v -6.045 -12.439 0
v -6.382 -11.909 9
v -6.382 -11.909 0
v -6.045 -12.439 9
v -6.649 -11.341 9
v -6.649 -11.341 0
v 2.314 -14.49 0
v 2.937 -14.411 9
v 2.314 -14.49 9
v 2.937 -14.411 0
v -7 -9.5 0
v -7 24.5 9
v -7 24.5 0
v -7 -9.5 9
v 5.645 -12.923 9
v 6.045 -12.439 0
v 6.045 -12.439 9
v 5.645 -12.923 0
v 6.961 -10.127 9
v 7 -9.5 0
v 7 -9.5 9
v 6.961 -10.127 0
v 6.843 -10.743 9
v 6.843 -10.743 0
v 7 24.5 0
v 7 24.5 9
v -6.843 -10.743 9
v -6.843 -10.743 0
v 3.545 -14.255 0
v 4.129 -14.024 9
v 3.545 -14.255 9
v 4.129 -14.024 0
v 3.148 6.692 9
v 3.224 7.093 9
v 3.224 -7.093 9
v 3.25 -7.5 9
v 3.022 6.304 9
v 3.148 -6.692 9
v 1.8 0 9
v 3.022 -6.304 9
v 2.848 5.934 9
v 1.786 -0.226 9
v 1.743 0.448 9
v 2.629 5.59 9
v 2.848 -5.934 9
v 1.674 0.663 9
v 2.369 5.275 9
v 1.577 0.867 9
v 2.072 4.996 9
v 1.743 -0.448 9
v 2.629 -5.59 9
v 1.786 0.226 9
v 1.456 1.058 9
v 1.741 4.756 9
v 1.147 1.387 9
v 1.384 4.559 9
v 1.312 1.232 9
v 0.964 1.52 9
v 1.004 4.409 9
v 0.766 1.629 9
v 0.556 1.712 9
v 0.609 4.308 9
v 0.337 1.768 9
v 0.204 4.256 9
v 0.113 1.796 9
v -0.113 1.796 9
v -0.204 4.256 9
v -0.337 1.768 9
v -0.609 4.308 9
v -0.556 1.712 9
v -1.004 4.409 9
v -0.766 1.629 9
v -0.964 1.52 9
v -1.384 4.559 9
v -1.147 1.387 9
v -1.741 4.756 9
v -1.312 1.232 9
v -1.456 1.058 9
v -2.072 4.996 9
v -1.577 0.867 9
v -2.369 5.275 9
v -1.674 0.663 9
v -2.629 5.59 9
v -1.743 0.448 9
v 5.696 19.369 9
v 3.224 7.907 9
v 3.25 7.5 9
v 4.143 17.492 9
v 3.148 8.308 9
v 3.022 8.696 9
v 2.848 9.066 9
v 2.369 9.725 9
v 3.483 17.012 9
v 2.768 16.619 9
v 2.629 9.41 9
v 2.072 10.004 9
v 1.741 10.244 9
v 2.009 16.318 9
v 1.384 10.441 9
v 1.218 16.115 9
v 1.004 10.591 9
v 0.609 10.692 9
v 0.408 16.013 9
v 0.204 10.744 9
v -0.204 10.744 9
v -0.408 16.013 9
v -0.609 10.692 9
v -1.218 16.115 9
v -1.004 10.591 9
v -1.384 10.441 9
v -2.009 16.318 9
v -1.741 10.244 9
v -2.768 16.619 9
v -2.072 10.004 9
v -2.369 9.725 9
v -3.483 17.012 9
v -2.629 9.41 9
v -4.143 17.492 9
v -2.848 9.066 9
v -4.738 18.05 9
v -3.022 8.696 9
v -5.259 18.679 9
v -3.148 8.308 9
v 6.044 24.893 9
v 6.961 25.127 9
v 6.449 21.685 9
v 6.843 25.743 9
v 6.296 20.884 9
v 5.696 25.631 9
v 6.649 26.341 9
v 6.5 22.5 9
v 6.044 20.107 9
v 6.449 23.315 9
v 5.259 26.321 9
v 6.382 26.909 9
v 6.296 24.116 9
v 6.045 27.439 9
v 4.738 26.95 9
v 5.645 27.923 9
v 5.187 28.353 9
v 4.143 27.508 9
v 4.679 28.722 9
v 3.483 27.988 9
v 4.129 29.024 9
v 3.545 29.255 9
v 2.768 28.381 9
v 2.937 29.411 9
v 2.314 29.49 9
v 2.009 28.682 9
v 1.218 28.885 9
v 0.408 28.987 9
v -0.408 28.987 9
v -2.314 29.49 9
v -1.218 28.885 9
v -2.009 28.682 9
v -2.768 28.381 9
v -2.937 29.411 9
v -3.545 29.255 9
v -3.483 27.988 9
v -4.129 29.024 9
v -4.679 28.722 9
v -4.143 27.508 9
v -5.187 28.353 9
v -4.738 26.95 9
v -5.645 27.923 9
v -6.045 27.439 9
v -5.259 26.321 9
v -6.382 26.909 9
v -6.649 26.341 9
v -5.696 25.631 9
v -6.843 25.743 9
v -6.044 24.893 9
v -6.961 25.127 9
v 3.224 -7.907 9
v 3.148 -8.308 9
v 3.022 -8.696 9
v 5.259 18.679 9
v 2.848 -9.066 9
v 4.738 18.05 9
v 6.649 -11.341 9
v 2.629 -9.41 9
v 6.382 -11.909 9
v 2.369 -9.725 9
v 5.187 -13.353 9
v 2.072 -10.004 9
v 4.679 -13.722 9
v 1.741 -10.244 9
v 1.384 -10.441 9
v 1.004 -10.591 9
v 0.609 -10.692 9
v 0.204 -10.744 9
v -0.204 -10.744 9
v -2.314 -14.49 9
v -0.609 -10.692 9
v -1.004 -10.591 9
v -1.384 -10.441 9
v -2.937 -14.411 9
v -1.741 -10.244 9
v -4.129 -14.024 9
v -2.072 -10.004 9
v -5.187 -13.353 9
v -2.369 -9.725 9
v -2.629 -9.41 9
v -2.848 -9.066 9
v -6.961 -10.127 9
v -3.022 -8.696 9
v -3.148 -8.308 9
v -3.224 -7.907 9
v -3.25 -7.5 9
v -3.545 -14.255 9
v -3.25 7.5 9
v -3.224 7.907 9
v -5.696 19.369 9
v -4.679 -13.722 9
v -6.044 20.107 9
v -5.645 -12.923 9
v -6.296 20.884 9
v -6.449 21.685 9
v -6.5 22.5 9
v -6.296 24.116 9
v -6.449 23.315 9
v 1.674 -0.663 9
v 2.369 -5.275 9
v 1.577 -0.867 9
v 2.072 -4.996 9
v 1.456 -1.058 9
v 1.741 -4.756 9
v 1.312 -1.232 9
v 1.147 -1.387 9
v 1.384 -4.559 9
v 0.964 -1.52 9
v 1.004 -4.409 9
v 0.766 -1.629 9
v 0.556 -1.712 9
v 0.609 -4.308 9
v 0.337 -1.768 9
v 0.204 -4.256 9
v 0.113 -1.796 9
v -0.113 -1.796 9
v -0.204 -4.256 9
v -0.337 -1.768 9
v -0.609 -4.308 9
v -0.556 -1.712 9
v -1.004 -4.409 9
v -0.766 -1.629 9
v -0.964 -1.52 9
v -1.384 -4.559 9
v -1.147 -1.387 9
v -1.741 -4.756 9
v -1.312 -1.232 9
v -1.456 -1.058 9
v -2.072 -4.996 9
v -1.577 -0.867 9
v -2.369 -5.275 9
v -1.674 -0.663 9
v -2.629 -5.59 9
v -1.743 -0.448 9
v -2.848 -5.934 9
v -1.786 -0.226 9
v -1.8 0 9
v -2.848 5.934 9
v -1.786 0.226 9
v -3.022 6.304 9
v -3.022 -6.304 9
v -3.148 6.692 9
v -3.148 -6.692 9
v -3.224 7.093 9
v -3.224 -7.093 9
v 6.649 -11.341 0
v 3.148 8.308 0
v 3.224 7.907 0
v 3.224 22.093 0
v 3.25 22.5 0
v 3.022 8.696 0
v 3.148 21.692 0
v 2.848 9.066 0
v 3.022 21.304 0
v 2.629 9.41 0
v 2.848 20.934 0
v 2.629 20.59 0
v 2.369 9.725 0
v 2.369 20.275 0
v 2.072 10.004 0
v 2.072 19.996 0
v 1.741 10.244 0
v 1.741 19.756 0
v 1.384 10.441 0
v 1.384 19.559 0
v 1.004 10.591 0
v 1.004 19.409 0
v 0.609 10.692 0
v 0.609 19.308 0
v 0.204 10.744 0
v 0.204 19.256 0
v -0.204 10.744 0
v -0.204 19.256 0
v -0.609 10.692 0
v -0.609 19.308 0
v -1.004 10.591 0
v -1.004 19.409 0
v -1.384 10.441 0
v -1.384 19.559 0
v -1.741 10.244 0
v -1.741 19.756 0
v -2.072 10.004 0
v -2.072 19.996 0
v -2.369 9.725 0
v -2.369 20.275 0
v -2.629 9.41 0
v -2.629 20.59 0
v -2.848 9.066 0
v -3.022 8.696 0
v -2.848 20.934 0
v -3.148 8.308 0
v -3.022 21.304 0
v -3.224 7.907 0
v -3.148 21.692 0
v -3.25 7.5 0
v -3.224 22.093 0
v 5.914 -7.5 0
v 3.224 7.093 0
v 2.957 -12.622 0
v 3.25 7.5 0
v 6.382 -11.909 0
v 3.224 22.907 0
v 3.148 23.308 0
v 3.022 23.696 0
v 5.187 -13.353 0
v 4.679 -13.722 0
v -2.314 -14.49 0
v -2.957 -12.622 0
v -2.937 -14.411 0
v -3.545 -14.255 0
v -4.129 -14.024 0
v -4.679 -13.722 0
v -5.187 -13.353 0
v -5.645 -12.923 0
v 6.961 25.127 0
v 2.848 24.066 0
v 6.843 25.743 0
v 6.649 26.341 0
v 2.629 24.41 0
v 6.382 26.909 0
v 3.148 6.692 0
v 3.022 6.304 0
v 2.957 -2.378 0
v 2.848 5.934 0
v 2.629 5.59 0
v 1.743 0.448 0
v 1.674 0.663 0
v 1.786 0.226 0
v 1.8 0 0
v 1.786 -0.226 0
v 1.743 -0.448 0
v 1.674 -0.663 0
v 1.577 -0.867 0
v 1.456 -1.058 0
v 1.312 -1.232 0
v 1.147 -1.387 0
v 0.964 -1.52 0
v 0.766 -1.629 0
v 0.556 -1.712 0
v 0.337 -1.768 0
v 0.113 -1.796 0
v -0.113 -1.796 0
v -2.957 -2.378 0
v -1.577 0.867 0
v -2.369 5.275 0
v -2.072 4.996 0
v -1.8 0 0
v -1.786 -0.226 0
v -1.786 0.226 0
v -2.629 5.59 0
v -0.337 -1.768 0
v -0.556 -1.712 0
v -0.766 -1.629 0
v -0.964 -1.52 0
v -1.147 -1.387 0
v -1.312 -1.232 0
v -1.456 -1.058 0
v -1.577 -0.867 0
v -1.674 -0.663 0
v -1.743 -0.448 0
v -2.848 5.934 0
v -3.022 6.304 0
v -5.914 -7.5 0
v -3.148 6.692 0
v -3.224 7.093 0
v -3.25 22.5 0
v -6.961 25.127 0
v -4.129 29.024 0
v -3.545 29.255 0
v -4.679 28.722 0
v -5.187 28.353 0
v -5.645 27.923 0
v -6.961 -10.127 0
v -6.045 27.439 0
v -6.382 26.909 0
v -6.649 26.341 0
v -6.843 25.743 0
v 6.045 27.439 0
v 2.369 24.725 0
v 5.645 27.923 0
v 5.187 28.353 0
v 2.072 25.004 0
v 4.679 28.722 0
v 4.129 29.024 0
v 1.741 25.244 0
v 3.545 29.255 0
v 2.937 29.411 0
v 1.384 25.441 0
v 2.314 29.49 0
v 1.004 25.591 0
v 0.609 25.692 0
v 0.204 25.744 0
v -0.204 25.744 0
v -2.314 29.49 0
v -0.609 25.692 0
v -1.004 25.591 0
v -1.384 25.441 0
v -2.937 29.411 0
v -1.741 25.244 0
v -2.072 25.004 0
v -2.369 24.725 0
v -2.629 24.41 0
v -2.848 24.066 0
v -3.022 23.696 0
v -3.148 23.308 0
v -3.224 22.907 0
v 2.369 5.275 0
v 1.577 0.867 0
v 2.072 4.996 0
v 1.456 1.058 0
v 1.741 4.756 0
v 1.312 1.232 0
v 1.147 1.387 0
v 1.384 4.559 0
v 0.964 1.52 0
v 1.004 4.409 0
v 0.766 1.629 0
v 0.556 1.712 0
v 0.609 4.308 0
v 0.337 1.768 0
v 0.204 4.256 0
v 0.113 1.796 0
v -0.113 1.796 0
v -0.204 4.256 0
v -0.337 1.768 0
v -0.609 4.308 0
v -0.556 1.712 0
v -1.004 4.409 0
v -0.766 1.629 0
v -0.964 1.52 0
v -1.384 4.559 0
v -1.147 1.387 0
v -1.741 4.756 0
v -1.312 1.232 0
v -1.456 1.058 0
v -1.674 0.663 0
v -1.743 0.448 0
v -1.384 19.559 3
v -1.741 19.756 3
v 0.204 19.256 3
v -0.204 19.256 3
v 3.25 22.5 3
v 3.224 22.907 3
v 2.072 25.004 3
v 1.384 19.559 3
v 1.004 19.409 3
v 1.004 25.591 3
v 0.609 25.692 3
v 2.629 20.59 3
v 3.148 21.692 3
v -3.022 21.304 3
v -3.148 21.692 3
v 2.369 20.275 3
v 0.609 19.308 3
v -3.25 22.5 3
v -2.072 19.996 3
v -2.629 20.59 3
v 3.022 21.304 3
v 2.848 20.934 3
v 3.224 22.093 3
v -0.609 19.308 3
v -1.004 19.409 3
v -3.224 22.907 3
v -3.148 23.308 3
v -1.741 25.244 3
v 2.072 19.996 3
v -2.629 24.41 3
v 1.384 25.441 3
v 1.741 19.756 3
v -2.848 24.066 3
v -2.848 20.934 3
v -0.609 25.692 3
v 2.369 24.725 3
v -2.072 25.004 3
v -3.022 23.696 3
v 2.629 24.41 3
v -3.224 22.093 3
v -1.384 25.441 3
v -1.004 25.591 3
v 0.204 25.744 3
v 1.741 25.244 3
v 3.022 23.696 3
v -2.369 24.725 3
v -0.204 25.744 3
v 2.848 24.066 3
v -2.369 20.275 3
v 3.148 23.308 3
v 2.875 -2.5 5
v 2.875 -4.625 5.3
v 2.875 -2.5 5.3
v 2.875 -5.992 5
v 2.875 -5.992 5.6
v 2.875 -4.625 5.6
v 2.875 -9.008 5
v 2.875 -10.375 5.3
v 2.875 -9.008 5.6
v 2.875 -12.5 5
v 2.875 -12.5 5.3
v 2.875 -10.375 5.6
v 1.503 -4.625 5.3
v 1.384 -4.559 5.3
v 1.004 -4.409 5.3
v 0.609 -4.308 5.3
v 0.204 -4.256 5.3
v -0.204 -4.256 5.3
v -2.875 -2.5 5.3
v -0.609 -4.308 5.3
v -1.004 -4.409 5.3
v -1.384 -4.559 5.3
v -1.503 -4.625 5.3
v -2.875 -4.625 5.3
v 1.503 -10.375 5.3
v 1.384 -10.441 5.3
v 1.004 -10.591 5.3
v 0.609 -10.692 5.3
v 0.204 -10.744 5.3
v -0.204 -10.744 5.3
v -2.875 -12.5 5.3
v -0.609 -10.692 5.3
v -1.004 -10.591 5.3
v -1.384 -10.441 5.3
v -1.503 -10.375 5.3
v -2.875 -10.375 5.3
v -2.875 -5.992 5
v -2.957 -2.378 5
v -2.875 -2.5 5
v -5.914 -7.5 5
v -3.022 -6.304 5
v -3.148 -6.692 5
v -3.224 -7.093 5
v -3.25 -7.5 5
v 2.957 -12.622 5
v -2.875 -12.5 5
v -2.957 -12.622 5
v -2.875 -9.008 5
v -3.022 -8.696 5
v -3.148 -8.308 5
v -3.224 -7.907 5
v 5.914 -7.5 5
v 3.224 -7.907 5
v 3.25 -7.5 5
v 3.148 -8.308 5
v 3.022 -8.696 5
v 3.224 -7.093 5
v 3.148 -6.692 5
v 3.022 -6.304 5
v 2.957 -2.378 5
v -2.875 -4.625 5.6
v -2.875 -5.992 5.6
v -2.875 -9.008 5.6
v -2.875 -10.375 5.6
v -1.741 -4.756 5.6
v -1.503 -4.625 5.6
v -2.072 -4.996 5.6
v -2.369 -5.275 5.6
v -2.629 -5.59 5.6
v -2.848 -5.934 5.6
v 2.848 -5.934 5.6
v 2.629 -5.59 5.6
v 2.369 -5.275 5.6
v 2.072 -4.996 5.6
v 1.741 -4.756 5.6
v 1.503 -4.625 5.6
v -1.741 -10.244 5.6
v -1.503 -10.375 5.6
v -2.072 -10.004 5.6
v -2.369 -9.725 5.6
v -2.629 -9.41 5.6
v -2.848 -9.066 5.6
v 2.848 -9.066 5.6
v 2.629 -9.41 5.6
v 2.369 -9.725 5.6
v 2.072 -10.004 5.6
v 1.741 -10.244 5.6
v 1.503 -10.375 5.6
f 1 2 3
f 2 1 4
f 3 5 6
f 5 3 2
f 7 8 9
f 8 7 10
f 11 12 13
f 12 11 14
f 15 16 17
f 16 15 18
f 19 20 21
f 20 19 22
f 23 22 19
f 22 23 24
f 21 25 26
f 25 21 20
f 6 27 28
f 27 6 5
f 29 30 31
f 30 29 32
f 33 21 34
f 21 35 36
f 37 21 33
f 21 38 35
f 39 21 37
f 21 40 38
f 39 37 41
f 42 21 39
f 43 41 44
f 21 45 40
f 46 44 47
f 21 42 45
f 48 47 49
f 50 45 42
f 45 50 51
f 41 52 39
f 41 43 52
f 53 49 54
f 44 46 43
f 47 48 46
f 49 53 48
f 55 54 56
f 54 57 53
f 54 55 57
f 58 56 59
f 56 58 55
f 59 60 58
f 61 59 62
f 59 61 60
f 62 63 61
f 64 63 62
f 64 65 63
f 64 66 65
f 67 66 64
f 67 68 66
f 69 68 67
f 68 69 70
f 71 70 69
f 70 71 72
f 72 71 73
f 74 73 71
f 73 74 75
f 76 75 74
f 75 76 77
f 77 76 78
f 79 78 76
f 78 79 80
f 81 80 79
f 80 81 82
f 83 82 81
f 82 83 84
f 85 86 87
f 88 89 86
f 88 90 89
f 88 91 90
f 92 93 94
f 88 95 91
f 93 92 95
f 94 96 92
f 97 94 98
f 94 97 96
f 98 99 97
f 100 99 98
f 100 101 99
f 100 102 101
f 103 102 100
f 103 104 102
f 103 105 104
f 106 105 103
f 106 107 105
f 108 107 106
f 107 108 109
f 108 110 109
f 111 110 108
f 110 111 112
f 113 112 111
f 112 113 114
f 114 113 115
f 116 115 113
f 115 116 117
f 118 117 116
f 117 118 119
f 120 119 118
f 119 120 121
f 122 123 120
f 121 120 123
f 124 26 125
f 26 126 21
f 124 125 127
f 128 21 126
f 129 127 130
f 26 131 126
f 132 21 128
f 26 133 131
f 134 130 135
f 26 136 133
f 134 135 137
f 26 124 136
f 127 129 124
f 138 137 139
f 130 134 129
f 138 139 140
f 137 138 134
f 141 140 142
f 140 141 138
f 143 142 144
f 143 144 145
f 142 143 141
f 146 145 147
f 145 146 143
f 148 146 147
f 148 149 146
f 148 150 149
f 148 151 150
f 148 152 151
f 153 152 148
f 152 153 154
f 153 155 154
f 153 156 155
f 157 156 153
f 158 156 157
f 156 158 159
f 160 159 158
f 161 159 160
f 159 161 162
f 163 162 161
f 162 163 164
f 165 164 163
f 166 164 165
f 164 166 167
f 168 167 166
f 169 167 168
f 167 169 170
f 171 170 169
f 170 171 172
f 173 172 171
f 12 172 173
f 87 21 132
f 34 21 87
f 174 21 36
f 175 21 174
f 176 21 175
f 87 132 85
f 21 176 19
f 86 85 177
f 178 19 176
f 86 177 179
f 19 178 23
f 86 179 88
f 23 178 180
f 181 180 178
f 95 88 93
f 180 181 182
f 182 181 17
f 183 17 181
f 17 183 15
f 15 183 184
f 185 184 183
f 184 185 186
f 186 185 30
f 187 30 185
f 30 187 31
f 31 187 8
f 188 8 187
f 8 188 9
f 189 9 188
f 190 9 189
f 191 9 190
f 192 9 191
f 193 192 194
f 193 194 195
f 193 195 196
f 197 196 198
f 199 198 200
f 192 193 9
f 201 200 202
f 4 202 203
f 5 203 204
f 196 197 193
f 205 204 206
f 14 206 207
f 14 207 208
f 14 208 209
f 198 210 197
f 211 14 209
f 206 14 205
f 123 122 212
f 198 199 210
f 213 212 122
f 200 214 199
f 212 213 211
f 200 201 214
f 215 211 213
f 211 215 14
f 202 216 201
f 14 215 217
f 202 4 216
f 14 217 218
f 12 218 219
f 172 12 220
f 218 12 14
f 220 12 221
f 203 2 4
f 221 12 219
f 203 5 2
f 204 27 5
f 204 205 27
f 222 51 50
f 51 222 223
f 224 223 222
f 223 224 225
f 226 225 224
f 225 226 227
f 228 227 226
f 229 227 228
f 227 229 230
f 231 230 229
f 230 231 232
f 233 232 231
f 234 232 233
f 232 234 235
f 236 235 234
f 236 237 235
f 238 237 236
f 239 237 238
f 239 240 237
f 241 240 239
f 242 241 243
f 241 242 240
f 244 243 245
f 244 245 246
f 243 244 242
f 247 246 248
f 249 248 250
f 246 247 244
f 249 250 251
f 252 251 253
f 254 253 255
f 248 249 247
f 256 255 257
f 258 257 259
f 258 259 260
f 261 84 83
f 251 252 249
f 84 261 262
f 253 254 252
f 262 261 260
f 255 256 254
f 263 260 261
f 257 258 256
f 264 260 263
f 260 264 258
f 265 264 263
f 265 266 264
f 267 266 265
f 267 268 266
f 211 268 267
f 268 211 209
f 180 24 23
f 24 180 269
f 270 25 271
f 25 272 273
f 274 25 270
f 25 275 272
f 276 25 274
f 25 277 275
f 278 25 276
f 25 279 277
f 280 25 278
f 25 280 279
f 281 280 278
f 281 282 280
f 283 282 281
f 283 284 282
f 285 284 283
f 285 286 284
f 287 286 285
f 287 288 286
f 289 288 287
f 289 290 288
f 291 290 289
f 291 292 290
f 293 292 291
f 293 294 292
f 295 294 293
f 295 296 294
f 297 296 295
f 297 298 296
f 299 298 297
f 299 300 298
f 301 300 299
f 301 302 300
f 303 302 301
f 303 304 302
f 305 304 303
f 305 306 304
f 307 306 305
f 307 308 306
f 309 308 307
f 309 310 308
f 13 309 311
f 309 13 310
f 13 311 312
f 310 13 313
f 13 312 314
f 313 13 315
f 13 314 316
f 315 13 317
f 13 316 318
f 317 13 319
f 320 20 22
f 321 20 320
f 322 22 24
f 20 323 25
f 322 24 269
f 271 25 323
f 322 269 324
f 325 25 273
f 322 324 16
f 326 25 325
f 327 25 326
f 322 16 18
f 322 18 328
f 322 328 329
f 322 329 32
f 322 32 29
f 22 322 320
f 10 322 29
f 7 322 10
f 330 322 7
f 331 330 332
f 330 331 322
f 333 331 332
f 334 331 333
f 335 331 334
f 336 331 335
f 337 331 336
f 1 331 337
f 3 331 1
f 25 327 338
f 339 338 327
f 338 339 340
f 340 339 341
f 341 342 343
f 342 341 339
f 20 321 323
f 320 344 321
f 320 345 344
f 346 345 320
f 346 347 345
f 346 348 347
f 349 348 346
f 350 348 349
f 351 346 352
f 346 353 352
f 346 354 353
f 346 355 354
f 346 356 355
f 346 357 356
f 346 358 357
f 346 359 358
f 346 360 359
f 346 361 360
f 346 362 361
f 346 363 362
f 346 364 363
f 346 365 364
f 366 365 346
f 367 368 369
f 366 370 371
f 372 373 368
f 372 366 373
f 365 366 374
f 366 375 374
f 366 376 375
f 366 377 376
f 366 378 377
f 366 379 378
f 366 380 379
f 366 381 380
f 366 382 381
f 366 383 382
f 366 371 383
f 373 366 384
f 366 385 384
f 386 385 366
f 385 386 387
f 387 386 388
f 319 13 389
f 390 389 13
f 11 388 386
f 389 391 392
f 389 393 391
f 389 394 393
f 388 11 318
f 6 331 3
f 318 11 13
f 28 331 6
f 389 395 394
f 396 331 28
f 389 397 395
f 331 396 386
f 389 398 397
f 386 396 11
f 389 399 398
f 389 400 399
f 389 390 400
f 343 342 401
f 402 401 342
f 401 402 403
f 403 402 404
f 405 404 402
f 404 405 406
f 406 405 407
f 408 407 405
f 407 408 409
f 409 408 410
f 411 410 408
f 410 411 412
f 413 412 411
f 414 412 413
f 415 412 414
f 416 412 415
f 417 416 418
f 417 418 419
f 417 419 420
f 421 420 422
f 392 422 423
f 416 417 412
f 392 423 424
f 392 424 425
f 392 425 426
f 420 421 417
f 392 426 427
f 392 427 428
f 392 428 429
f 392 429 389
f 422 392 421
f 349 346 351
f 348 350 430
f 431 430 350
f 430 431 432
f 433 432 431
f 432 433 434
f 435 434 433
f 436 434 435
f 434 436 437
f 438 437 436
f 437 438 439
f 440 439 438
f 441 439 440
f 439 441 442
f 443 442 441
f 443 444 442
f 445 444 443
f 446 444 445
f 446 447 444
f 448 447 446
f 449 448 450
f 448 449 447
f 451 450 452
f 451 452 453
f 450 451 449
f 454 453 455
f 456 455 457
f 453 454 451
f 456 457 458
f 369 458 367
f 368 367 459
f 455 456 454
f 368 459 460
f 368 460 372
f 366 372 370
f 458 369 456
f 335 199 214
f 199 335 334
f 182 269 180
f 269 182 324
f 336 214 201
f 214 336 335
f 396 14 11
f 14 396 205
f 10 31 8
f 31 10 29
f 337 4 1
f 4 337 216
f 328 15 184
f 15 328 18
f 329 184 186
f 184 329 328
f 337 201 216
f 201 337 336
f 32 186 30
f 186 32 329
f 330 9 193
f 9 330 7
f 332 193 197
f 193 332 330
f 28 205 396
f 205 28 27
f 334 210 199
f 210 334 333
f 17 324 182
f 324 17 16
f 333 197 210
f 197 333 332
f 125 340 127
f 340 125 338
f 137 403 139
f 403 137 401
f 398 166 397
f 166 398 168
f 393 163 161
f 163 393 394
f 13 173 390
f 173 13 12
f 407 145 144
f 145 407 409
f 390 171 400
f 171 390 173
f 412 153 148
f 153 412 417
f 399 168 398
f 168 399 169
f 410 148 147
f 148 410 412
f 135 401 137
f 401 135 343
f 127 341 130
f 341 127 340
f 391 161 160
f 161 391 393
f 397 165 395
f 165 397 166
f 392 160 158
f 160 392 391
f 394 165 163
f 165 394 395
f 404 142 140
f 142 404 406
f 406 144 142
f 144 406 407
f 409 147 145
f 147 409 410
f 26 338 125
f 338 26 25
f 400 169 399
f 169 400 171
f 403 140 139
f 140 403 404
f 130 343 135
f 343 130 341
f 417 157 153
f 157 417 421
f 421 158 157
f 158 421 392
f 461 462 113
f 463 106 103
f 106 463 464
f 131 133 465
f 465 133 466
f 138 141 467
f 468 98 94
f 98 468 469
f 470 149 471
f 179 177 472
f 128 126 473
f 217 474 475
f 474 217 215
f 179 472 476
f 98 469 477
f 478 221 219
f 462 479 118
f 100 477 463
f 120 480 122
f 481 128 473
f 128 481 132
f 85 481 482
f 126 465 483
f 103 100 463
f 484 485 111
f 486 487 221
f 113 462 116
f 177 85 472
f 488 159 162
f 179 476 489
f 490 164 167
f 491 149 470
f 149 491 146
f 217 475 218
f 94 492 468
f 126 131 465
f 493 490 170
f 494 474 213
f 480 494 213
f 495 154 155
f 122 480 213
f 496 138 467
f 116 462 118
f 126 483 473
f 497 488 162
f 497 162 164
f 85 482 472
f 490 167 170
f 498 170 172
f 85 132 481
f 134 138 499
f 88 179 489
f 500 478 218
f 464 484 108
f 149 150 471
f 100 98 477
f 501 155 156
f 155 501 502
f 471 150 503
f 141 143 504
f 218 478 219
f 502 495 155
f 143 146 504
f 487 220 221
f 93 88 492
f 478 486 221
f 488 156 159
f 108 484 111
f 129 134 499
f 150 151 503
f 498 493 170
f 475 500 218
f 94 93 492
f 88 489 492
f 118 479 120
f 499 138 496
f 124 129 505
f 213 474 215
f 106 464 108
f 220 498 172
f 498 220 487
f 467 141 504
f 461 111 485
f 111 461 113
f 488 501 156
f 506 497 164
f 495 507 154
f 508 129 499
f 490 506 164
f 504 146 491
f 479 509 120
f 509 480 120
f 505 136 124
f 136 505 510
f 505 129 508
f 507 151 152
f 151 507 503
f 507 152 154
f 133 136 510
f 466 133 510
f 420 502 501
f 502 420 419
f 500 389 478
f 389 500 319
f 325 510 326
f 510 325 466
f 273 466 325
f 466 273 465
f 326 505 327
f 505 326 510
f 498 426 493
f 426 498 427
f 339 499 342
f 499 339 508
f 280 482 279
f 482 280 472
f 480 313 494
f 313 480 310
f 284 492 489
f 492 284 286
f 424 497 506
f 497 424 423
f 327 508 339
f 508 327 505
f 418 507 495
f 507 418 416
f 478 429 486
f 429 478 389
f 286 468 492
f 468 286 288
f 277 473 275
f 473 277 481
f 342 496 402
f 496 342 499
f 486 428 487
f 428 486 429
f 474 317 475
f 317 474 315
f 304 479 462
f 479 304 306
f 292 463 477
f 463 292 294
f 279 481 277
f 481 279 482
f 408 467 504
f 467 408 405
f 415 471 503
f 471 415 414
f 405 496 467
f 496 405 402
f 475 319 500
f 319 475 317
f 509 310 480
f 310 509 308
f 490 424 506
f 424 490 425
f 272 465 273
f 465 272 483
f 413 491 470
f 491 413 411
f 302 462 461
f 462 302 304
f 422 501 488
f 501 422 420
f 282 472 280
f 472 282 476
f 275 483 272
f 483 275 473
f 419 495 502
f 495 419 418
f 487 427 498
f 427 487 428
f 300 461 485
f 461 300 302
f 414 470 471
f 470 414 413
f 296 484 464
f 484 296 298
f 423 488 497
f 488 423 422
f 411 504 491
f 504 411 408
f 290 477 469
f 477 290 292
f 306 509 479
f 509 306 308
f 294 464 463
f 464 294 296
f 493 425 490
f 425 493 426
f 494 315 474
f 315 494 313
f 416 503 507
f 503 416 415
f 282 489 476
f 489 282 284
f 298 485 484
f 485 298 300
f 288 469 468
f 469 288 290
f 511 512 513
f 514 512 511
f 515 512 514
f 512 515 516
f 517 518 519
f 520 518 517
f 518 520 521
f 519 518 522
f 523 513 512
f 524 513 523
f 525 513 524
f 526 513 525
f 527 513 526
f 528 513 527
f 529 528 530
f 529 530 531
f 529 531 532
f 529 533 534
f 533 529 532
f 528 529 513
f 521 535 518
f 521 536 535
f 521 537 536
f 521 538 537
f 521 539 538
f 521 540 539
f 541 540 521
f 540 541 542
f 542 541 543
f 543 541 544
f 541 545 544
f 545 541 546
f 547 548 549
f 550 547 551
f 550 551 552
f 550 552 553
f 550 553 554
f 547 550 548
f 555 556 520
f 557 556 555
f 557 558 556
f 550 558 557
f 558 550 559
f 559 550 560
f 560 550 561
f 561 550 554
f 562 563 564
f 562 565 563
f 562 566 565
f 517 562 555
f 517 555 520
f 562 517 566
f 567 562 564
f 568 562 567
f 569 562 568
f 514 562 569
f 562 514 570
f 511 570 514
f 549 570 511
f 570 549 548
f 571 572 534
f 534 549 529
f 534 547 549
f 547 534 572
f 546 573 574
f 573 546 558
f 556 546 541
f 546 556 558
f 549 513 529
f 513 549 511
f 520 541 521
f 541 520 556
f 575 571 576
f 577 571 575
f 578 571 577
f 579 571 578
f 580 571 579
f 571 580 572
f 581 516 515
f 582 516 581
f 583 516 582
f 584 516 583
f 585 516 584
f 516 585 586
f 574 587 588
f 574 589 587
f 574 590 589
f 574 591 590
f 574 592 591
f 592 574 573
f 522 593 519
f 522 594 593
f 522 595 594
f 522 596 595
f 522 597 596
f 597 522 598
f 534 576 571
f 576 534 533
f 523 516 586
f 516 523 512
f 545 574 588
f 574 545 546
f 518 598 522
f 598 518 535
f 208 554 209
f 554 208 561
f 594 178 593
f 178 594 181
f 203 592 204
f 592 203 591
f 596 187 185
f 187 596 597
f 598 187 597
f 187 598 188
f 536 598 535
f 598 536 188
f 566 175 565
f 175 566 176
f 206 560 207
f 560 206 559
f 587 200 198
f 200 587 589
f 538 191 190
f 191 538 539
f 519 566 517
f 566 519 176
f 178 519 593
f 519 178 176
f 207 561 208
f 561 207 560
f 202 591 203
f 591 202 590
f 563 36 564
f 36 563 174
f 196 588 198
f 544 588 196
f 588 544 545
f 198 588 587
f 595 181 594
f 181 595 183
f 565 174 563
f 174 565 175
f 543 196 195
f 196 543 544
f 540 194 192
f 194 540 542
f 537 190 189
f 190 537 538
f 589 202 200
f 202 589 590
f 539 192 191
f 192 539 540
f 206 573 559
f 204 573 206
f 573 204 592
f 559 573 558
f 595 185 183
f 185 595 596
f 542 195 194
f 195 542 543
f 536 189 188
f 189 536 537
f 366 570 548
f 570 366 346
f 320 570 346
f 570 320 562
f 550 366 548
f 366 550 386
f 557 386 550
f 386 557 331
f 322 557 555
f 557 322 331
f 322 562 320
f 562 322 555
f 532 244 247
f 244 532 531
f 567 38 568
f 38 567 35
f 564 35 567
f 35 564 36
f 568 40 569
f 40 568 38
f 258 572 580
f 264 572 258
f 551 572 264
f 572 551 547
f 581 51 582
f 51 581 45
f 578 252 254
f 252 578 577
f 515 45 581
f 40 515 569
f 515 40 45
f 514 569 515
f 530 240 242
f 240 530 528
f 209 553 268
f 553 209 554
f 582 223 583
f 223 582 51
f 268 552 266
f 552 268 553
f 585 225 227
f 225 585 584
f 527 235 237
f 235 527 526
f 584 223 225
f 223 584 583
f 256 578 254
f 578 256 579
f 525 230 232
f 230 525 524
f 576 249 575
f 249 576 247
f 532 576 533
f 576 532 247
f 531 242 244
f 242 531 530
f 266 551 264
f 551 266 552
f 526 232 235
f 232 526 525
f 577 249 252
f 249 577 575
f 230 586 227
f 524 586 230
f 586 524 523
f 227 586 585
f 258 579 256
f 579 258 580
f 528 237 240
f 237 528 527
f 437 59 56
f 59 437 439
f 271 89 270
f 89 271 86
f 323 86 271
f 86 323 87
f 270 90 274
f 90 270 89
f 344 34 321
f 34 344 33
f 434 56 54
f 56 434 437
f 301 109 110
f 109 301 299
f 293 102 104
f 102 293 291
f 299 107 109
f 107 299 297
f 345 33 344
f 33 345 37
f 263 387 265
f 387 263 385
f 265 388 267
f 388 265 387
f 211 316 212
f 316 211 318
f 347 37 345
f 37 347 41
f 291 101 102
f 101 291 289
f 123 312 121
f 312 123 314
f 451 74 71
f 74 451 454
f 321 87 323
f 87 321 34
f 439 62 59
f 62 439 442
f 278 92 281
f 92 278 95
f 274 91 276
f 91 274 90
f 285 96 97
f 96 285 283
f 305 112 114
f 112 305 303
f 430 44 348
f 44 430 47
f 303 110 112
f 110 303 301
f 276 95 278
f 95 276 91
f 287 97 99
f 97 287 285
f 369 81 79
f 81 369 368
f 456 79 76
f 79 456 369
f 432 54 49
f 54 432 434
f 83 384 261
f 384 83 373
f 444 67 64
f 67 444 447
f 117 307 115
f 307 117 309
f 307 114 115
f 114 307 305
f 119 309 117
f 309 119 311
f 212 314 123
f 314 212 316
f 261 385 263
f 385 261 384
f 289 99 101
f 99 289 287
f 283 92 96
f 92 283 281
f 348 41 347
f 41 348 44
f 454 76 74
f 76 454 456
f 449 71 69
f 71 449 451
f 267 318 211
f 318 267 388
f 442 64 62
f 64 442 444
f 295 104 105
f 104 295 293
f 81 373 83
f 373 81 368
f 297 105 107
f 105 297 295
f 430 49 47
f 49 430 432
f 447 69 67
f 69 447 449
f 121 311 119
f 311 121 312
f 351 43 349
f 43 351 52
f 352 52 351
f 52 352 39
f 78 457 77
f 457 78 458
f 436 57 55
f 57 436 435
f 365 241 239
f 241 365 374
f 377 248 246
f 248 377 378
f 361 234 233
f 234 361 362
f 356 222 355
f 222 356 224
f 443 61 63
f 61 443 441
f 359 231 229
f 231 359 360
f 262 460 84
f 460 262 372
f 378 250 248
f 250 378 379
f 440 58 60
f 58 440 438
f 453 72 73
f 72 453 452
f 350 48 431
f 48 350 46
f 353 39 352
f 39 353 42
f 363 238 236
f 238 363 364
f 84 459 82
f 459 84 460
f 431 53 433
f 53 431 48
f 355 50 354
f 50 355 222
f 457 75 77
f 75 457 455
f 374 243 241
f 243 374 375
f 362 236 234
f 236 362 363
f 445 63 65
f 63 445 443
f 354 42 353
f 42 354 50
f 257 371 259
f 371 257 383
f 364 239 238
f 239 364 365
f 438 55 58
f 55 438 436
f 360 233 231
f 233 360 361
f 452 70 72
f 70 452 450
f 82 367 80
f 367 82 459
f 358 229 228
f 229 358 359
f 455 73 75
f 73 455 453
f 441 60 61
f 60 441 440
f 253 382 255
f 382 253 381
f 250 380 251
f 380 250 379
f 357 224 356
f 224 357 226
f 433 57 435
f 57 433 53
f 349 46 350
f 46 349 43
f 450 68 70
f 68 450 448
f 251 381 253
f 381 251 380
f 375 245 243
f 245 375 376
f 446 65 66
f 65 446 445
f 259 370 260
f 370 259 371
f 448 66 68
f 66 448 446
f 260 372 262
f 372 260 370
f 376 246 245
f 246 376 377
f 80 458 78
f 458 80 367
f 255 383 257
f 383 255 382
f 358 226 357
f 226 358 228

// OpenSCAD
$fn = 50;


difference() {
	union() {
		hull() {
			translate(v = [-2.0000000000, 9.5000000000, 0]) {
				cylinder(h = 9, r = 5);
			}
			translate(v = [2.0000000000, 9.5000000000, 0]) {
				cylinder(h = 9, r = 5);
			}
			translate(v = [-2.0000000000, -9.5000000000, 0]) {
				cylinder(h = 9, r = 5);
			}
			translate(v = [2.0000000000, -9.5000000000, 0]) {
				cylinder(h = 9, r = 5);
			}
		}
		translate(v = [0.0000000000, 15.0000000000, 0]) {
			hull() {
				translate(v = [-2.0000000000, 9.5000000000, 0]) {
					cylinder(h = 9, r = 5);
				}
				translate(v = [2.0000000000, 9.5000000000, 0]) {
					cylinder(h = 9, r = 5);
				}
				translate(v = [-2.0000000000, -9.5000000000, 0]) {
					cylinder(h = 9, r = 5);
				}
				translate(v = [2.0000000000, -9.5000000000, 0]) {
					cylinder(h = 9, r = 5);
				}
			}
		}
		translate(v = [0.0000000000, 15.0000000000, 0]) {
			hull() {
				translate(v = [-2.0000000000, 9.5000000000, 0]) {
					cylinder(h = 9, r = 5);
				}
				translate(v = [2.0000000000, 9.5000000000, 0]) {
					cylinder(h = 9, r = 5);
				}
				translate(v = [-2.0000000000, -9.5000000000, 0]) {
					cylinder(h = 9, r = 5);
				}
				translate(v = [2.0000000000, -9.5000000000, 0]) {
					cylinder(h = 9, r = 5);
				}
			}
		}
	}
	union() {
		translate(v = [0.0000000000, 22.5000000000, 9]) {
			rotate(a = [0, 0, 0]) {
				difference() {
					union() {
						#translate(v = [0, 0, -9.0000000000]) {
							cylinder(h = 9, r = 2.2500000000);
						}
						#translate(v = [0, 0, -6]) {
							cylinder(h = 6, r1 = 3.2500000000, r2 = 6.5000000000);
						}
						#translate(v = [0, 0, -9.0000000000]) {
							cylinder(h = 9, r = 3.2500000000);
						}
						#translate(v = [0, 0, -9.0000000000]) {
							cylinder(h = 9, r = 2.2500000000);
						}
					}
					union();
				}
			}
		}
		translate(v = [0.0000000000, 22.5000000000, 9]) {
			rotate(a = [0, 0, 0]) {
				difference() {
					union() {
						#translate(v = [0, 0, -9.0000000000]) {
							cylinder(h = 9, r = 2.2500000000);
						}
						#translate(v = [0, 0, -6]) {
							cylinder(h = 6, r1 = 3.2500000000, r2 = 6.5000000000);
						}
						#translate(v = [0, 0, -9.0000000000]) {
							cylinder(h = 9, r = 3.2500000000);
						}
						#translate(v = [0, 0, -9.0000000000]) {
							cylinder(h = 9, r = 2.2500000000);
						}
					}
					union();
				}
			}
		}
		translate(v = [0.0000000000, -7.5000000000, 0]) {
			rotate(a = [0, 0, 0]) {
				difference() {
					union() {
						#translate(v = [-2.8750000000, -5.0000000000, -0.3000000000]) {
							cube(size = [5.7500000000, 10, 0.3000000000]);
						}
						#translate(v = [-2.8750000000, -2.8750000000, -0.6000000000]) {
							cube(size = [5.7500000000, 5.7500000000, 0.3000000000]);
						}
						#translate(v = [-2.8750000000, -5.0000000000, 5]) {
							cube(size = [5.7500000000, 10, 0.3000000000]);
						}
						#translate(v = [-2.8750000000, -2.8750000000, 5.3000000000]) {
							cube(size = [5.7500000000, 5.7500000000, 0.3000000000]);
						}
						#translate(v = [0, 0, -100.0000000000]) {
							cylinder(h = 200, r = 3.2500000000);
						}
						#linear_extrude(height = 5) {
							polygon(points = [[5.9142500000, 0.0000000000], [2.9571250000, 5.1218907443], [-2.9571250000, 5.1218907443], [-5.9142500000, 0.0000000000], [-2.9571250000, -5.1218907443], [2.9571250000, -5.1218907443]]);
						}
						#translate(v = [-2.8750000000, -5.0000000000, -0.3000000000]) {
							cube(size = [5.7500000000, 10, 0.3000000000]);
						}
						#translate(v = [-2.8750000000, -2.8750000000, -0.6000000000]) {
							cube(size = [5.7500000000, 5.7500000000, 0.3000000000]);
						}
						#translate(v = [-2.8750000000, -5.0000000000, 5]) {
							cube(size = [5.7500000000, 10, 0.3000000000]);
						}
						#translate(v = [-2.8750000000, -2.8750000000, 5.3000000000]) {
							cube(size = [5.7500000000, 5.7500000000, 0.3000000000]);
						}
						#translate(v = [0, 0, -100.0000000000]) {
							cylinder(h = 200, r = 3.2500000000);
						}
						#translate(v = [-2.8750000000, -5.0000000000, -0.3000000000]) {
							cube(size = [5.7500000000, 10, 0.3000000000]);
						}
						#translate(v = [-2.8750000000, -2.8750000000, -0.6000000000]) {
							cube(size = [5.7500000000, 5.7500000000, 0.3000000000]);
						}
						#translate(v = [-2.8750000000, -5.0000000000, 5]) {
							cube(size = [5.7500000000, 10, 0.3000000000]);
						}
						#translate(v = [-2.8750000000, -2.8750000000, 5.3000000000]) {
							cube(size = [5.7500000000, 5.7500000000, 0.3000000000]);
						}
						#translate(v = [0, 0, -100.0000000000]) {
							cylinder(h = 200, r = 3.2500000000);
						}
					}
					union();
				}
			}
		}
		translate(v = [0.0000000000, -7.5000000000, 0]) {
			translate(v = [0, 0, -100]) {
				cylinder(h = 200, r = 3.2500000000);
			}
		}
		translate(v = [0.0000000000, 7.5000000000, 0]) {
			translate(v = [0, 0, -100]) {
				cylinder(h = 200, r = 3.2500000000);
			}
		}
		translate(v = [0.0000000000, -7.5000000000, 0]) {
			translate(v = [0, 0, -100]) {
				cylinder(h = 200, r = 1.8000000000);
			}
		}
		translate(v = [0, 0, -100]) {
			cylinder(h = 200, r = 1.8000000000);
		}
		translate(v = [0.0000000000, 7.5000000000, 0]) {
			translate(v = [0, 0, -100]) {
				cylinder(h = 200, r = 1.8000000000);
			}
		}
	}
}
